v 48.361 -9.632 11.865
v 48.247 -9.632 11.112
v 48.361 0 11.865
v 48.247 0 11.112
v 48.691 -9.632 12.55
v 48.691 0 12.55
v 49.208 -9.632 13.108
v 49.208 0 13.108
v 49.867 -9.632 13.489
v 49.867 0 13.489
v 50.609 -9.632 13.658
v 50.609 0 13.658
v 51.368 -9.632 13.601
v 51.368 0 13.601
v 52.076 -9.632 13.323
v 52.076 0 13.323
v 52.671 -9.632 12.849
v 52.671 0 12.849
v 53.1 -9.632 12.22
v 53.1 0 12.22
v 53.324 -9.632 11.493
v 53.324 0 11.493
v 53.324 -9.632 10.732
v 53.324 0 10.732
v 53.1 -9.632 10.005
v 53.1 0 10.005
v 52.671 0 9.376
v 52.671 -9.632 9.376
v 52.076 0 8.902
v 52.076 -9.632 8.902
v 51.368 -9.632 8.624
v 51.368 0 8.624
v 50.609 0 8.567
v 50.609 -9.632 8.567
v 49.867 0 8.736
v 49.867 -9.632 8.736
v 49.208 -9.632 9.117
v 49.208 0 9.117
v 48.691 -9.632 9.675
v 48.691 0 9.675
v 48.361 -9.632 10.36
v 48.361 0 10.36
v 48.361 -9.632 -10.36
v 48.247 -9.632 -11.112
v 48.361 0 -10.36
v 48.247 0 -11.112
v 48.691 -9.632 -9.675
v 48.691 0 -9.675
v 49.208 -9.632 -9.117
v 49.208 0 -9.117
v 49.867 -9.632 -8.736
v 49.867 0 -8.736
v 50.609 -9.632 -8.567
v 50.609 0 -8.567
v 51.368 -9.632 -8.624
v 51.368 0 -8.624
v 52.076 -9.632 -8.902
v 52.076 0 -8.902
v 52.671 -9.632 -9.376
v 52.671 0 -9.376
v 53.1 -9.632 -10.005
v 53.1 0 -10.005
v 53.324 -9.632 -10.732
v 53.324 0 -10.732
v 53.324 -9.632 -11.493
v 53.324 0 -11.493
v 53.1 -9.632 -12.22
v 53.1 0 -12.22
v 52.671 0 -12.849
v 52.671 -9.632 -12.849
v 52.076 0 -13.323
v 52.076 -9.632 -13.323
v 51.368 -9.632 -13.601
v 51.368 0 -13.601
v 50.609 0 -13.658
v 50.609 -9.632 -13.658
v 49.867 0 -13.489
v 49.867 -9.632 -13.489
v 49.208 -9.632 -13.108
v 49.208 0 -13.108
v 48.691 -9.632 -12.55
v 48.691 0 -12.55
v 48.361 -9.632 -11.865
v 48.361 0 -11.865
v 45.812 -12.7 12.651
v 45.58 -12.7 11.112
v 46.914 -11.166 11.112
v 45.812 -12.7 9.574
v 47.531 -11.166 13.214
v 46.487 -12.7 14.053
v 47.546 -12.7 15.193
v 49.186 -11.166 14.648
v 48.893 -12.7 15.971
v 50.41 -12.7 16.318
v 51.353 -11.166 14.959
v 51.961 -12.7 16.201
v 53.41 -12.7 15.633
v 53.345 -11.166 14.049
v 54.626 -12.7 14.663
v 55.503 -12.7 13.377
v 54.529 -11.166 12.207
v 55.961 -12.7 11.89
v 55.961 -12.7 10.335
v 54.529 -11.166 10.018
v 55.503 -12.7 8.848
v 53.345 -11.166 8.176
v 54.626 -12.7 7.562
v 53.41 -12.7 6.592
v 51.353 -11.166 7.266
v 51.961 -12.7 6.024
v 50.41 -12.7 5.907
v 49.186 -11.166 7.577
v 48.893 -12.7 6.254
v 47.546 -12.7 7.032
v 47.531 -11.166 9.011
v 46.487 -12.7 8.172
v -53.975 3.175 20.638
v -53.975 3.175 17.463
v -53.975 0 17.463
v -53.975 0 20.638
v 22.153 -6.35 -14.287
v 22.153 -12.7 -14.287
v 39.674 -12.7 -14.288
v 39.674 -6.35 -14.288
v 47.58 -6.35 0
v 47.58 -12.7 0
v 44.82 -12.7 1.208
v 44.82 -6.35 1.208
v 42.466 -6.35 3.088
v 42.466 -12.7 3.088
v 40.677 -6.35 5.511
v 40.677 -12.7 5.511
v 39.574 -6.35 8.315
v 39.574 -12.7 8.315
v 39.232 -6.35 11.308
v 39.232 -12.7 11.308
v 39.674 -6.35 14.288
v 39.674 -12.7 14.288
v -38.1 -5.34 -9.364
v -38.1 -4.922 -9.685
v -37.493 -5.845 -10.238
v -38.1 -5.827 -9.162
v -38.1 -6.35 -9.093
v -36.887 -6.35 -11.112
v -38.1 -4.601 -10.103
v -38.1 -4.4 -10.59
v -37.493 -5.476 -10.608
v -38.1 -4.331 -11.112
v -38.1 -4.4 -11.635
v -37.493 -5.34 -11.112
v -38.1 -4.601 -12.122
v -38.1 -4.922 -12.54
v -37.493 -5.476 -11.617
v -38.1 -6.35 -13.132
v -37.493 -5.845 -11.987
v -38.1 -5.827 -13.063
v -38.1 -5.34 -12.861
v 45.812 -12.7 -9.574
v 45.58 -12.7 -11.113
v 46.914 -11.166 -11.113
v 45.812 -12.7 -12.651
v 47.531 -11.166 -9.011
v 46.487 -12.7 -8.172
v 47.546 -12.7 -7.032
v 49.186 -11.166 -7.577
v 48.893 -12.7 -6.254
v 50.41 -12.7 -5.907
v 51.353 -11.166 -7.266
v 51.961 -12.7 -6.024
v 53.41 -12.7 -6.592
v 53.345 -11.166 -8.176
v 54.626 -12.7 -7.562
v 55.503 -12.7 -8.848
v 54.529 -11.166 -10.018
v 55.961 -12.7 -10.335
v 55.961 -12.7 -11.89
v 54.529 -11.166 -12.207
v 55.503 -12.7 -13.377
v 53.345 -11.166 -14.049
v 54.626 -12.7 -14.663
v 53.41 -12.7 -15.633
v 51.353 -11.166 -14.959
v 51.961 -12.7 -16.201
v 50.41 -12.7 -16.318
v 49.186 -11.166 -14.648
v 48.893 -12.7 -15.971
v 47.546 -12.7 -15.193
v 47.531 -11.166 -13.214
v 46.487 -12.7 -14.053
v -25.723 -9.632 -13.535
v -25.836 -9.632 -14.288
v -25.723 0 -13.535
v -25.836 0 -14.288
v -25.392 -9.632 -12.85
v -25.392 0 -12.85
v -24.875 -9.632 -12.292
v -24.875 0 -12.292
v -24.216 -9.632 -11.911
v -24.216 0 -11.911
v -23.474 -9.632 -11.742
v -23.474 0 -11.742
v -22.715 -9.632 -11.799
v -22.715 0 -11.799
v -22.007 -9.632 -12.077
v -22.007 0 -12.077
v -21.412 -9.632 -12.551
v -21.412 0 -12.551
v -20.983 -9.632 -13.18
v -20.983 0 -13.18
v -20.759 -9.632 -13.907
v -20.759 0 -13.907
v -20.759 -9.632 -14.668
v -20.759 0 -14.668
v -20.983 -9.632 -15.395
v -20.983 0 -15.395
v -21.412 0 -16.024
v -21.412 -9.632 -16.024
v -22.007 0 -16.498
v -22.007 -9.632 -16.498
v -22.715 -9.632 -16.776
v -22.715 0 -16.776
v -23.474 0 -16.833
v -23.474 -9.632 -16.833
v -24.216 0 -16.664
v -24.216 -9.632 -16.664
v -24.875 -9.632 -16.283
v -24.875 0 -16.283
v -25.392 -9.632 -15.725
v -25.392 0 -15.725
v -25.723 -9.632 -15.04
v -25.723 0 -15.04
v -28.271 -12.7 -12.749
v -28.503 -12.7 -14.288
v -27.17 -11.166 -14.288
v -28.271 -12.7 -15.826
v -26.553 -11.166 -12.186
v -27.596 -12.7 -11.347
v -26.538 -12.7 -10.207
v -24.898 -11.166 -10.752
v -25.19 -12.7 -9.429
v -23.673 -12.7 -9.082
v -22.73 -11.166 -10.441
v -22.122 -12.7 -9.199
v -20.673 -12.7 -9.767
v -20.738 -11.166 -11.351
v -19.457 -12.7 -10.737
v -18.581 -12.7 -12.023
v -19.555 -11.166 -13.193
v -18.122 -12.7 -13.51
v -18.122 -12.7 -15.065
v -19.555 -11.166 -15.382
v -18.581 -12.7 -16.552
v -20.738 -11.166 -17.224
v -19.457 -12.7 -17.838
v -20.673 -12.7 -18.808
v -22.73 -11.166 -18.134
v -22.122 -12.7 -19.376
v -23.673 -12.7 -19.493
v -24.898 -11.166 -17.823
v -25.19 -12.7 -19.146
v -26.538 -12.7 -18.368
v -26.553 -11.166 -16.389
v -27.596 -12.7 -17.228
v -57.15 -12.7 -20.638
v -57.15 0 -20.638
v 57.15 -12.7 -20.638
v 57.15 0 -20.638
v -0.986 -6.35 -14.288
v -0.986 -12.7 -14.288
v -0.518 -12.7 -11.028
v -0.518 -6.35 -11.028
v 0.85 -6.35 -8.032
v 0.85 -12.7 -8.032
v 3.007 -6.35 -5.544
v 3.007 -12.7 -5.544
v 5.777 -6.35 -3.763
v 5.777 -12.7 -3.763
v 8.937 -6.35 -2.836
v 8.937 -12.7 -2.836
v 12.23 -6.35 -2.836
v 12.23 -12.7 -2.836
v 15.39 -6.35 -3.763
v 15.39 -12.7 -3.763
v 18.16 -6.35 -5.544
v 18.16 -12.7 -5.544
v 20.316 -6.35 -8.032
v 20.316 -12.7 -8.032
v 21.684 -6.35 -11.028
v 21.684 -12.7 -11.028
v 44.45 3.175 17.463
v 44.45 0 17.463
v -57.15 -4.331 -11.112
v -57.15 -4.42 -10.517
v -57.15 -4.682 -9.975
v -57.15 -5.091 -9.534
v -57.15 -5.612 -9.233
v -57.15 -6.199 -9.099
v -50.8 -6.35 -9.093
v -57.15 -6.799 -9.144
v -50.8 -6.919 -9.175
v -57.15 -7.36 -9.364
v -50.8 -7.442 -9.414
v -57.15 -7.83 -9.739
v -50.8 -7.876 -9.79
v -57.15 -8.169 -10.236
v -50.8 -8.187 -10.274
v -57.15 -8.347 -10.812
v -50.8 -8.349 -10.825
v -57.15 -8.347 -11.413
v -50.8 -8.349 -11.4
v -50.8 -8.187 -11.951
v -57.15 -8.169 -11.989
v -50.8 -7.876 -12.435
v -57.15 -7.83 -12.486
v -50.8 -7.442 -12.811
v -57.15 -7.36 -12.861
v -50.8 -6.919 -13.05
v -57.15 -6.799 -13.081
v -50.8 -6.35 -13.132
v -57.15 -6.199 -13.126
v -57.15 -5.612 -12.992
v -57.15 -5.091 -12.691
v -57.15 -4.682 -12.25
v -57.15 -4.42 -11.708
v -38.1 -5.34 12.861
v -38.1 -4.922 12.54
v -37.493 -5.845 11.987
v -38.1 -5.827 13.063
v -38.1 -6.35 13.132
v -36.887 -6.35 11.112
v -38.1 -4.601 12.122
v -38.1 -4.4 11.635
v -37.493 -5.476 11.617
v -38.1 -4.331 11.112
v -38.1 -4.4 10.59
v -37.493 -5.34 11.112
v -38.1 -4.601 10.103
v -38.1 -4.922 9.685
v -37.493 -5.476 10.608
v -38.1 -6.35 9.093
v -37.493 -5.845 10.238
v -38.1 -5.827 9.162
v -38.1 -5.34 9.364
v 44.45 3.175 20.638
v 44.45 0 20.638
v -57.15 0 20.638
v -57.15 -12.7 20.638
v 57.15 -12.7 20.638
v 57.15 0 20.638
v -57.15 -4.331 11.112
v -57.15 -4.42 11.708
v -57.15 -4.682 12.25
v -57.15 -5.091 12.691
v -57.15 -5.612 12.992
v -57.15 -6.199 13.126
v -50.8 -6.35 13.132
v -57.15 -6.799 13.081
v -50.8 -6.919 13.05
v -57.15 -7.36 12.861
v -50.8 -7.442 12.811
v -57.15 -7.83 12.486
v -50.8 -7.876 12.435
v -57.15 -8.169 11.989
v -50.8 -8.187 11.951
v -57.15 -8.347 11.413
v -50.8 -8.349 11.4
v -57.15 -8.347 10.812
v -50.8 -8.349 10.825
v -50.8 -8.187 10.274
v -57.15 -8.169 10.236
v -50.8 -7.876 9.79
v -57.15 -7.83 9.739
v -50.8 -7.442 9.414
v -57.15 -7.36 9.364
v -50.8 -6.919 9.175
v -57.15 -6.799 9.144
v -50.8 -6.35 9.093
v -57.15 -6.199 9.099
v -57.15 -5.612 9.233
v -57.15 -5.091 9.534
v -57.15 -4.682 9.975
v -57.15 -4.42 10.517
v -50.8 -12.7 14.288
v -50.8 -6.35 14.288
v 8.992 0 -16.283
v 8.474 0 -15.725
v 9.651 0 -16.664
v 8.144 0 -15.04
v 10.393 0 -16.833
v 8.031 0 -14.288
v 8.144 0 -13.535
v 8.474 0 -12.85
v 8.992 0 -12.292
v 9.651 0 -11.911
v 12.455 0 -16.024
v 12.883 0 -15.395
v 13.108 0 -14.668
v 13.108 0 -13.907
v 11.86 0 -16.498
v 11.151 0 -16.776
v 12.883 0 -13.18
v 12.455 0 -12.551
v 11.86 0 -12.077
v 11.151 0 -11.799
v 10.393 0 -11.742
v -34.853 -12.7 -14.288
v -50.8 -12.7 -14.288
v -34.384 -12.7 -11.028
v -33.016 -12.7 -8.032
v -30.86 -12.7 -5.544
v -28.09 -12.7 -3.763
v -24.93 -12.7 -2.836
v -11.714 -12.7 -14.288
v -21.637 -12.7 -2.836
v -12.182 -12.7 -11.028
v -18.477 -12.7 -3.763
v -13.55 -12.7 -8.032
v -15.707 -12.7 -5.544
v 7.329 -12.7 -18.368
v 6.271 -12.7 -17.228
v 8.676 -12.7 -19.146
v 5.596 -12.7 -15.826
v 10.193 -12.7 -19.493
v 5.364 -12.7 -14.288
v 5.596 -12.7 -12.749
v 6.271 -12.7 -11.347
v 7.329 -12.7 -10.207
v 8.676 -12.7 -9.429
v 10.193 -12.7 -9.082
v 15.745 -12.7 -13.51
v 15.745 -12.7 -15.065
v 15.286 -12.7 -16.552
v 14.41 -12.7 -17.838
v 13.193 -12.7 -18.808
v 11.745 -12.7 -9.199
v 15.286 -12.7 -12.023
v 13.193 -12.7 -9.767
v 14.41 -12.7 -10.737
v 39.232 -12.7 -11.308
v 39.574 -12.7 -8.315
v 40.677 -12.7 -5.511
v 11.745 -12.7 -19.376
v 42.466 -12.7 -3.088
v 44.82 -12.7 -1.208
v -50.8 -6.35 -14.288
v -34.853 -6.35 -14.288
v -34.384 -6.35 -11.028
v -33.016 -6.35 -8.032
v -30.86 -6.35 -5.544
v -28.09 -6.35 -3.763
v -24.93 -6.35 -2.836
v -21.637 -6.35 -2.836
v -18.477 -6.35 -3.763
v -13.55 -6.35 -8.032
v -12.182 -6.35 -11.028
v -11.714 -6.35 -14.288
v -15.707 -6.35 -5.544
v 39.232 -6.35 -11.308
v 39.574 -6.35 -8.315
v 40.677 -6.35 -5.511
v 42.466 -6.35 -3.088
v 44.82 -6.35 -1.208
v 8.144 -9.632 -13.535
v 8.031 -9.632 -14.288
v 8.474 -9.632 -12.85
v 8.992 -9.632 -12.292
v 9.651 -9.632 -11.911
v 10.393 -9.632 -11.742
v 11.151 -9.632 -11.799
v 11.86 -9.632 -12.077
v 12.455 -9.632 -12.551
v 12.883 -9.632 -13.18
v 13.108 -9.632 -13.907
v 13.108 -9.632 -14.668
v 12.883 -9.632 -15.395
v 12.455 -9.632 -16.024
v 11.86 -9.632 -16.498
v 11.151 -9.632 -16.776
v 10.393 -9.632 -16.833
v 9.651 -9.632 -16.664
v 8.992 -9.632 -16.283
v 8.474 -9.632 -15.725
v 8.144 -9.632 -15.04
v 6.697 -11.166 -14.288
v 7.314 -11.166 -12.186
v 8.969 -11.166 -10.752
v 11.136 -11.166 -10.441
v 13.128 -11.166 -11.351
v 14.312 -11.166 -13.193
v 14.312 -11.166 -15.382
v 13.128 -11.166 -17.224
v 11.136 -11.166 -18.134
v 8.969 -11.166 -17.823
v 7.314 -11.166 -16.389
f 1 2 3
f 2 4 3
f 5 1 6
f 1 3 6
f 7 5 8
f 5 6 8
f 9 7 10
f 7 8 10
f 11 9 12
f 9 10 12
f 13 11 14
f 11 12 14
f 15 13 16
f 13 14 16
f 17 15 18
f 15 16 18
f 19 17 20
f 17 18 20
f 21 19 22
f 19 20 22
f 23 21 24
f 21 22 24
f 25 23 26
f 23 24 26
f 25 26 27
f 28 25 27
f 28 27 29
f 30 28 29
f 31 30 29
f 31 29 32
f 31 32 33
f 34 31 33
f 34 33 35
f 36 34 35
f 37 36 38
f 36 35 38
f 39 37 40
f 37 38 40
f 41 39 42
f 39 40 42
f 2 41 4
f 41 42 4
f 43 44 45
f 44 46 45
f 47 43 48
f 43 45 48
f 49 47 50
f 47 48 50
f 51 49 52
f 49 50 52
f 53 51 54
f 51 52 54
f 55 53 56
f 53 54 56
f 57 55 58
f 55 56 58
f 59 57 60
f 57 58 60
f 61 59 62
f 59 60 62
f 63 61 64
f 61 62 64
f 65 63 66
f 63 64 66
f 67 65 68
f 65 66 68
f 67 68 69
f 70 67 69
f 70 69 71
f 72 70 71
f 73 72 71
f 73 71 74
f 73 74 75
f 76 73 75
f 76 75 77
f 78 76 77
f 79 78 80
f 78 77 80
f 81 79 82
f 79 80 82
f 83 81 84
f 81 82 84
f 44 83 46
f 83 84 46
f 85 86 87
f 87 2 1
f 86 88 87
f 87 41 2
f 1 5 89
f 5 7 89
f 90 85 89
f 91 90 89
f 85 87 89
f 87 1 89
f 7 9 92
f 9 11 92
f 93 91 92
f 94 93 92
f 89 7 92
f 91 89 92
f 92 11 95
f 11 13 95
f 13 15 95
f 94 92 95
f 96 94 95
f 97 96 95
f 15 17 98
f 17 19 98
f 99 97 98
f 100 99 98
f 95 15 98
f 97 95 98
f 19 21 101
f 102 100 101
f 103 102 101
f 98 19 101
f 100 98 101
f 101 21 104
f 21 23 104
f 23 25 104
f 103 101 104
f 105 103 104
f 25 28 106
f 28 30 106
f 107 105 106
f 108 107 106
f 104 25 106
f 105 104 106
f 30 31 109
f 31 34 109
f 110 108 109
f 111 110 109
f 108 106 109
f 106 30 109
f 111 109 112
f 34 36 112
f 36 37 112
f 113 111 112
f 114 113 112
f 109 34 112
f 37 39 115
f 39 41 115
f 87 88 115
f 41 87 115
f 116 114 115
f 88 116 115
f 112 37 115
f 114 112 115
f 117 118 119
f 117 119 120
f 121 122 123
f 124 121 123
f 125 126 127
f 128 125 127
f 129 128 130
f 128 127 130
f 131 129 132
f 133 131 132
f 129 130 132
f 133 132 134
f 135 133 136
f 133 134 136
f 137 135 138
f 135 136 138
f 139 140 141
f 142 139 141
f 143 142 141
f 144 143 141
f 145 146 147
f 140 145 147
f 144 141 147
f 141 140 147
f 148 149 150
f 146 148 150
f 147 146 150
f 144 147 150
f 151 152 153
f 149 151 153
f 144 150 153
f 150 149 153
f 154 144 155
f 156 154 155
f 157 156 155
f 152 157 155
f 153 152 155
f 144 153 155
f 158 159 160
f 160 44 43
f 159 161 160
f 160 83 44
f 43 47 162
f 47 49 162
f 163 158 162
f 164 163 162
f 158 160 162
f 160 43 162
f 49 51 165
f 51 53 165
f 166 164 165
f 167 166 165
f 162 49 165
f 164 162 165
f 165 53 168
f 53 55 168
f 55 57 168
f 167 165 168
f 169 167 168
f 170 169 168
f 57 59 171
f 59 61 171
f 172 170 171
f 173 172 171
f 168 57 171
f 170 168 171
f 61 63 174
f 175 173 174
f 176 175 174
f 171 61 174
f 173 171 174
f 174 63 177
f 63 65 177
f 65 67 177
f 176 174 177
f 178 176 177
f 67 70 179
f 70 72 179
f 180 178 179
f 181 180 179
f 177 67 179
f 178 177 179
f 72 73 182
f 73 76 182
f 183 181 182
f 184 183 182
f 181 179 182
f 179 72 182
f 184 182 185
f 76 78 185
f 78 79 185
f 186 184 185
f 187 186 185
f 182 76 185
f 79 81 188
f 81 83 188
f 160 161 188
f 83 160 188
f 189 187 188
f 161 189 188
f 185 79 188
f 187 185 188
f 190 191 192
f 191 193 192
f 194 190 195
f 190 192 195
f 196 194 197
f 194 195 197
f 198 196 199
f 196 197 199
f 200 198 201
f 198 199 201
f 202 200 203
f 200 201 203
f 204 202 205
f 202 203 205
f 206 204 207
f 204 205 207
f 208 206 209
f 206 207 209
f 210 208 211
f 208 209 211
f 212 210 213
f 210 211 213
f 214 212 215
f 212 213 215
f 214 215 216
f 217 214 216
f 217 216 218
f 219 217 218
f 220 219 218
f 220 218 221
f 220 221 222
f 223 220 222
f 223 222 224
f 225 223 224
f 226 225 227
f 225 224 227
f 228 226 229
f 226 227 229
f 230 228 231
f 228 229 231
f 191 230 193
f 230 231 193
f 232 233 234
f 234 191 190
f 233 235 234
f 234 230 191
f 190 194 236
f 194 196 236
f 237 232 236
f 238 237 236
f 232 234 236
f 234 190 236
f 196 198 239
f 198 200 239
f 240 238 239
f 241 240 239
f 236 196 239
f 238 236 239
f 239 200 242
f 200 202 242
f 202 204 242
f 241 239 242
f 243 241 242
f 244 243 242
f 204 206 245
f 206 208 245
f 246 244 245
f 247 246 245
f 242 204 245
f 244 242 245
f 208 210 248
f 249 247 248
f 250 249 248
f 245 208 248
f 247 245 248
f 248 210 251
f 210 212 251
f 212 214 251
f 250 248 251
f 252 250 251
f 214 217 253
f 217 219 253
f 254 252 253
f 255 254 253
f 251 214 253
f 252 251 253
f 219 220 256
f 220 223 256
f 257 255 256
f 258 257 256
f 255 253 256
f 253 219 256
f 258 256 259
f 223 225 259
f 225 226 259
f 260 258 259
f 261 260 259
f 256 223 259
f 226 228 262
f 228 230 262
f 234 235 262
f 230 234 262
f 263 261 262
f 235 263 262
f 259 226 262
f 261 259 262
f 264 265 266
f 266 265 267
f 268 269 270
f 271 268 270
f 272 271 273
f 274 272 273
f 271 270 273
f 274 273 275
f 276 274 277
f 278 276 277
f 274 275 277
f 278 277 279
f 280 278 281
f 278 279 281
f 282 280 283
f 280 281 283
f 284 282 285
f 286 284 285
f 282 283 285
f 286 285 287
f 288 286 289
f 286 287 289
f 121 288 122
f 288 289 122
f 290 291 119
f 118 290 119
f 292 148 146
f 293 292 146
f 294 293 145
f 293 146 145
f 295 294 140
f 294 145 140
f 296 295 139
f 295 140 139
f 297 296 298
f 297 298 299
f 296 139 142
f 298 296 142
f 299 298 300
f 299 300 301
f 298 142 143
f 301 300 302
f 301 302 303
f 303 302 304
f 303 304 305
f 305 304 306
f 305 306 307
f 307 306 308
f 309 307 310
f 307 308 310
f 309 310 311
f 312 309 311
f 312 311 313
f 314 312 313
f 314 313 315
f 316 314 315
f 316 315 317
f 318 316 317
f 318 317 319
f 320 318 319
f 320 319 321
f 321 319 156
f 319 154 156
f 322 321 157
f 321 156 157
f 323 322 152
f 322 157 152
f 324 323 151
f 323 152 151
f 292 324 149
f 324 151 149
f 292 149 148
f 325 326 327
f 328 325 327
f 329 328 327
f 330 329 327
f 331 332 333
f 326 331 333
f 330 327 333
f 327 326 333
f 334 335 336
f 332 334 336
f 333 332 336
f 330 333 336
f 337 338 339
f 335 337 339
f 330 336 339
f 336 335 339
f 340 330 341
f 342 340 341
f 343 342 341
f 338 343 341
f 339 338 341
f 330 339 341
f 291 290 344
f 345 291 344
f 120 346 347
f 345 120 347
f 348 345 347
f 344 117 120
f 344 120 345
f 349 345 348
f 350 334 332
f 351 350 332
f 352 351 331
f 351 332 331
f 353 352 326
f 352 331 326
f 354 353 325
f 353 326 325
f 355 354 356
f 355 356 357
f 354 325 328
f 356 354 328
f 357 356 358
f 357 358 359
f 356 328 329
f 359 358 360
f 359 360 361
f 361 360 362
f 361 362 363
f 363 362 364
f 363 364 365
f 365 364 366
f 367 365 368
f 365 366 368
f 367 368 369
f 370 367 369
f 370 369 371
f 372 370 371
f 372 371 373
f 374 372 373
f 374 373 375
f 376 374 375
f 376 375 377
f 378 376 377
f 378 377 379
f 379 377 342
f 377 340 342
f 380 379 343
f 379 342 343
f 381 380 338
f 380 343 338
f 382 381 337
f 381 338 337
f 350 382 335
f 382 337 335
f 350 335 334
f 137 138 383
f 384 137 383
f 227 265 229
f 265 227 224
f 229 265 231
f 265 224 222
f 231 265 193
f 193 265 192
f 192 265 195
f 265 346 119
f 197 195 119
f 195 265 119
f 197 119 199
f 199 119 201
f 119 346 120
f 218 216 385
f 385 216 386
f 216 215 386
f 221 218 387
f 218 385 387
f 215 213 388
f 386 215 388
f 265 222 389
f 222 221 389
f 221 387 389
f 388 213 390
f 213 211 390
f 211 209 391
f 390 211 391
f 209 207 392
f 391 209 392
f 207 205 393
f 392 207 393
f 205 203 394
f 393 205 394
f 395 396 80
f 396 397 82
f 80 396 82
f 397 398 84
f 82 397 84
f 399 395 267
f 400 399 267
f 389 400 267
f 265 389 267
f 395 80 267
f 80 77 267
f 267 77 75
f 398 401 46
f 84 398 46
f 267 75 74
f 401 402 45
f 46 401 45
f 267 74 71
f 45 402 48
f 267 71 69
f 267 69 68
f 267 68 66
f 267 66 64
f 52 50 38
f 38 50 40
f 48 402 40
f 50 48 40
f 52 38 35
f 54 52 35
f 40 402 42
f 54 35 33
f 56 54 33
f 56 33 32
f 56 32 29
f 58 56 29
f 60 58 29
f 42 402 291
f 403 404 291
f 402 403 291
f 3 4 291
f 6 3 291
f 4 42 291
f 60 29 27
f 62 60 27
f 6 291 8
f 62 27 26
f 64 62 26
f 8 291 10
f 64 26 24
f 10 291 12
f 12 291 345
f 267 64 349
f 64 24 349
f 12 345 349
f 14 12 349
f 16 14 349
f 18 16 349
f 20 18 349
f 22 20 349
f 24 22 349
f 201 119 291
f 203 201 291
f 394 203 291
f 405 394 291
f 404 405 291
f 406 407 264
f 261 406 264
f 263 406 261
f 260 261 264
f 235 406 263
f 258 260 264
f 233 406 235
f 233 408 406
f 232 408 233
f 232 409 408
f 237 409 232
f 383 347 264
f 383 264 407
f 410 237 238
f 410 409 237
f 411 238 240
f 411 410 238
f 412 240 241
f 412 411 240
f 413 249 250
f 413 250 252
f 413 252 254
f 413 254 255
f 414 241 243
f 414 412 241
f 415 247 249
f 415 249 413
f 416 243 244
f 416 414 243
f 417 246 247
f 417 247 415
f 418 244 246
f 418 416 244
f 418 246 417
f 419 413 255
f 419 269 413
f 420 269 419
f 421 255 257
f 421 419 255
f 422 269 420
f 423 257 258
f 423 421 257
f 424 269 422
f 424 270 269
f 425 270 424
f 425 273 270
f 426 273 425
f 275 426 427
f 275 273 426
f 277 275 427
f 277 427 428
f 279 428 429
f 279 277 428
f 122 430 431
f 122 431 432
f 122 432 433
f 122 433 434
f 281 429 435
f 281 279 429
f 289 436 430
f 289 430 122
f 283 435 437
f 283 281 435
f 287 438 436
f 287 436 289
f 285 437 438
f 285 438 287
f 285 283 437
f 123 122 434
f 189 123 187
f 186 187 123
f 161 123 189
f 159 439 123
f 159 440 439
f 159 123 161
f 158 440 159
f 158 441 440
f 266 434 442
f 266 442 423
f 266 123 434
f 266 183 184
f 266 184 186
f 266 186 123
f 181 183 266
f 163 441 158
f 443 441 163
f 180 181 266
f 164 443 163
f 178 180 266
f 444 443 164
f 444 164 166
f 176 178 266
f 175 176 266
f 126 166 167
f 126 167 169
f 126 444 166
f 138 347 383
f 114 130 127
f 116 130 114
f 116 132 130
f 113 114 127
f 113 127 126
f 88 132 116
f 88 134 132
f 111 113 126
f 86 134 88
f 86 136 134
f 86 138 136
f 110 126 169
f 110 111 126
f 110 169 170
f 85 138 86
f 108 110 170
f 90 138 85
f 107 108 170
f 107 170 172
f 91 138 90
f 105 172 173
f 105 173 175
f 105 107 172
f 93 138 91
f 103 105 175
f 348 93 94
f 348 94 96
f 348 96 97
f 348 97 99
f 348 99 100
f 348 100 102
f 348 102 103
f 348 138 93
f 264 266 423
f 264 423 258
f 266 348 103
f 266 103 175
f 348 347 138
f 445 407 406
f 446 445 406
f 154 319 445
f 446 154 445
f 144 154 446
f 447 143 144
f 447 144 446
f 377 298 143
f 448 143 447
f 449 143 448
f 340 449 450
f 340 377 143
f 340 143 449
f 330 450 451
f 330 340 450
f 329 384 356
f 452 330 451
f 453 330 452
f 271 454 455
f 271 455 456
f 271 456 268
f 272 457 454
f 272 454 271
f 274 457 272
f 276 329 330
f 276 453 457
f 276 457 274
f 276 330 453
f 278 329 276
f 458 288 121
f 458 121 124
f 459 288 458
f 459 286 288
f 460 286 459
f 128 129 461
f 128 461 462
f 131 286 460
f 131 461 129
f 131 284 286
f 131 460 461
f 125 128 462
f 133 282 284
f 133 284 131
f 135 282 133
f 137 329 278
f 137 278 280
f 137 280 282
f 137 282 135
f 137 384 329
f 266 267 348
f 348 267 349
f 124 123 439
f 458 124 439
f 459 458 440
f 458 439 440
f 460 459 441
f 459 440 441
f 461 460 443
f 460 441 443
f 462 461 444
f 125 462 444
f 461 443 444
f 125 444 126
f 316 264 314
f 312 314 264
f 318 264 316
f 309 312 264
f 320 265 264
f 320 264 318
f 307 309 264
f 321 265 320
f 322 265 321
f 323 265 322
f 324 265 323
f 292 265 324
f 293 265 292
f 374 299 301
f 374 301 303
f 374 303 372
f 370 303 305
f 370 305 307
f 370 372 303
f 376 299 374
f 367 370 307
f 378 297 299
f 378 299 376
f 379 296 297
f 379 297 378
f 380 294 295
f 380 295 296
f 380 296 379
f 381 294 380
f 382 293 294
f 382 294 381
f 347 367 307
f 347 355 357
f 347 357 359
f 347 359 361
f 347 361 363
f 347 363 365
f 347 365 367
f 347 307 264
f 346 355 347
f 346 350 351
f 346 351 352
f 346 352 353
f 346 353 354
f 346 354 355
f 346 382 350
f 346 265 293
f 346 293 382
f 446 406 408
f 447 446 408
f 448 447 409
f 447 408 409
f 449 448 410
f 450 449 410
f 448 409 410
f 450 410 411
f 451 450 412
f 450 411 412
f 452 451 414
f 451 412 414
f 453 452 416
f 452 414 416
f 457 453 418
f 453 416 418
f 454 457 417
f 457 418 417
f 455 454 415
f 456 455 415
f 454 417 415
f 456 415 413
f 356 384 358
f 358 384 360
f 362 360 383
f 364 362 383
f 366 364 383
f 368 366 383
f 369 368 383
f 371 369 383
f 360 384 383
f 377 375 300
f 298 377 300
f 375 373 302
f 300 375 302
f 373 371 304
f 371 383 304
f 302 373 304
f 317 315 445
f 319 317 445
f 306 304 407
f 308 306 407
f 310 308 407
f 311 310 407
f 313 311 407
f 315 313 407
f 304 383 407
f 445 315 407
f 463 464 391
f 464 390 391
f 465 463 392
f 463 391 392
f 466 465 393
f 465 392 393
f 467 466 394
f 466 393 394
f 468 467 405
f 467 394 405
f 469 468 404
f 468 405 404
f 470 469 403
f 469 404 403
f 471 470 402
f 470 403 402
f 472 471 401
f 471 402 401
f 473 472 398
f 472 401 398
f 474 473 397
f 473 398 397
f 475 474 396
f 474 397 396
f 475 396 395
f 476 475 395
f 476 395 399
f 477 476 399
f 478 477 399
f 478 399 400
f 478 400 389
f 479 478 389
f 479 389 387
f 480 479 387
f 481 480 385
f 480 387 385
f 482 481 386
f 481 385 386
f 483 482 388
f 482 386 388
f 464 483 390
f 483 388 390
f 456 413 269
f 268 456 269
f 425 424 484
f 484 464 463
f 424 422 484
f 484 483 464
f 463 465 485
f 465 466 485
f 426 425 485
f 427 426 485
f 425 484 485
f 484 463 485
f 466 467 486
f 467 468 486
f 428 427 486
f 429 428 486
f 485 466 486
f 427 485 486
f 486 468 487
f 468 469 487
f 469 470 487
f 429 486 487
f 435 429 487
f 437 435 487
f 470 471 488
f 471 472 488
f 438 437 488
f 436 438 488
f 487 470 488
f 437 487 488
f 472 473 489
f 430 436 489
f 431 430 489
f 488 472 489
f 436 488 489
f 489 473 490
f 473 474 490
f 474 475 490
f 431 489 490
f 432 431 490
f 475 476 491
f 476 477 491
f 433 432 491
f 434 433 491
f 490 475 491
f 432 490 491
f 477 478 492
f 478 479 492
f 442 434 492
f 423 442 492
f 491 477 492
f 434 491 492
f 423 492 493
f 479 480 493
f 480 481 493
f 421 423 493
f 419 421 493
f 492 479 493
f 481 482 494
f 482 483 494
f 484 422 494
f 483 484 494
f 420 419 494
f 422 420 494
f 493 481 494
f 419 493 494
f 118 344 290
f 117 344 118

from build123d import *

# Parameters (mm, degrees)
F0_W           = 114.3
F0_H           = 41.275
F1_DEPTH       = 12.7
F3_D           = 5.1054
F3_CSINK_D     = 10.4394
F3_CSINK_ANGLE = 82
F5_D           = 4.0386
F5_DEPTH       = 19.05
F5_TIP         = 1.213317848
F6_W           = 98.425
F6_H           = 3.175
F7_DEPTH       = 3.175
F9_DEPTH       = 6.35


with BuildPart() as f1:
    # F0 (on Front) → F1 (new body)
    with BuildSketch(Plane.XZ):
        Rectangle(F0_W, F0_H)
    extrude(amount=F1_DEPTH)

    # F3 (through all)
    with Locations(Plane.XZ.offset(12.7)):
        with Locations((50.8, 11.1125), (50.8, -11.1125), (-23.2833333333, -14.2875), (10.5833333333, -14.2875)):
            CounterSinkHole(F3_D / 2, F3_CSINK_D / 2, counter_sink_angle=F3_CSINK_ANGLE)

    # F5
    with Locations(Plane(origin=(-57.15, 0, 0), x_dir=(0, -1, 0), z_dir=(-1, 0, 0))):
        with Locations((6.35, 11.1125), (6.35, -11.1125)):
            Hole(F5_D / 2, depth=F5_DEPTH)
            with Locations((0, 0, -(F5_DEPTH + F5_TIP / 2))):  # 118° drill point
                Cone(0, F5_D / 2, F5_TIP, mode=Mode.SUBTRACT)

    # F6 (on face) → F7 (join)
    with BuildSketch(Plane(origin=(0, 0, 0), x_dir=(-1, 0, 0), z_dir=(0, 1, 0))):
        with Locations((4.7625, 19.05)):
            Rectangle(F6_W, F6_H)
    extrude(amount=F7_DEPTH)

    # F8 (on face) → F9 (cut)
    with BuildSketch(Plane.XZ.offset(12.7)):
        with BuildLine():
            Line((39.6744738062, 14.2875), (-50.8, 14.2875))
            Line((-50.8, 14.2875), (-50.8, -14.2875))
            Line((-50.8, -14.2875), (-34.8530333333, -14.2875))
            ThreePointArc((-34.8530333333, -14.2875), (-23.2833333333, -2.7178), (-11.7136333333, -14.2875))
            Line((-11.7136333333, -14.2875), (-0.9863666667, -14.2875))
            ThreePointArc((-0.9863666667, -14.2875), (10.5833333333, -2.7178), (22.1530333333, -14.2875))
            Line((22.1530333333, -14.2875), (39.6744738062, -14.2875))
            ThreePointArc((39.6744738062, -14.2875), (40.6765711012, -5.5112371584), (47.5797046968, 0))
            ThreePointArc((47.5797046968, 0), (40.6765711012, 5.5112371584), (39.6744738062, 14.2875))
        make_face()
    extrude(amount=-F9_DEPTH, mode=Mode.SUBTRACT)


solid = f1.part
